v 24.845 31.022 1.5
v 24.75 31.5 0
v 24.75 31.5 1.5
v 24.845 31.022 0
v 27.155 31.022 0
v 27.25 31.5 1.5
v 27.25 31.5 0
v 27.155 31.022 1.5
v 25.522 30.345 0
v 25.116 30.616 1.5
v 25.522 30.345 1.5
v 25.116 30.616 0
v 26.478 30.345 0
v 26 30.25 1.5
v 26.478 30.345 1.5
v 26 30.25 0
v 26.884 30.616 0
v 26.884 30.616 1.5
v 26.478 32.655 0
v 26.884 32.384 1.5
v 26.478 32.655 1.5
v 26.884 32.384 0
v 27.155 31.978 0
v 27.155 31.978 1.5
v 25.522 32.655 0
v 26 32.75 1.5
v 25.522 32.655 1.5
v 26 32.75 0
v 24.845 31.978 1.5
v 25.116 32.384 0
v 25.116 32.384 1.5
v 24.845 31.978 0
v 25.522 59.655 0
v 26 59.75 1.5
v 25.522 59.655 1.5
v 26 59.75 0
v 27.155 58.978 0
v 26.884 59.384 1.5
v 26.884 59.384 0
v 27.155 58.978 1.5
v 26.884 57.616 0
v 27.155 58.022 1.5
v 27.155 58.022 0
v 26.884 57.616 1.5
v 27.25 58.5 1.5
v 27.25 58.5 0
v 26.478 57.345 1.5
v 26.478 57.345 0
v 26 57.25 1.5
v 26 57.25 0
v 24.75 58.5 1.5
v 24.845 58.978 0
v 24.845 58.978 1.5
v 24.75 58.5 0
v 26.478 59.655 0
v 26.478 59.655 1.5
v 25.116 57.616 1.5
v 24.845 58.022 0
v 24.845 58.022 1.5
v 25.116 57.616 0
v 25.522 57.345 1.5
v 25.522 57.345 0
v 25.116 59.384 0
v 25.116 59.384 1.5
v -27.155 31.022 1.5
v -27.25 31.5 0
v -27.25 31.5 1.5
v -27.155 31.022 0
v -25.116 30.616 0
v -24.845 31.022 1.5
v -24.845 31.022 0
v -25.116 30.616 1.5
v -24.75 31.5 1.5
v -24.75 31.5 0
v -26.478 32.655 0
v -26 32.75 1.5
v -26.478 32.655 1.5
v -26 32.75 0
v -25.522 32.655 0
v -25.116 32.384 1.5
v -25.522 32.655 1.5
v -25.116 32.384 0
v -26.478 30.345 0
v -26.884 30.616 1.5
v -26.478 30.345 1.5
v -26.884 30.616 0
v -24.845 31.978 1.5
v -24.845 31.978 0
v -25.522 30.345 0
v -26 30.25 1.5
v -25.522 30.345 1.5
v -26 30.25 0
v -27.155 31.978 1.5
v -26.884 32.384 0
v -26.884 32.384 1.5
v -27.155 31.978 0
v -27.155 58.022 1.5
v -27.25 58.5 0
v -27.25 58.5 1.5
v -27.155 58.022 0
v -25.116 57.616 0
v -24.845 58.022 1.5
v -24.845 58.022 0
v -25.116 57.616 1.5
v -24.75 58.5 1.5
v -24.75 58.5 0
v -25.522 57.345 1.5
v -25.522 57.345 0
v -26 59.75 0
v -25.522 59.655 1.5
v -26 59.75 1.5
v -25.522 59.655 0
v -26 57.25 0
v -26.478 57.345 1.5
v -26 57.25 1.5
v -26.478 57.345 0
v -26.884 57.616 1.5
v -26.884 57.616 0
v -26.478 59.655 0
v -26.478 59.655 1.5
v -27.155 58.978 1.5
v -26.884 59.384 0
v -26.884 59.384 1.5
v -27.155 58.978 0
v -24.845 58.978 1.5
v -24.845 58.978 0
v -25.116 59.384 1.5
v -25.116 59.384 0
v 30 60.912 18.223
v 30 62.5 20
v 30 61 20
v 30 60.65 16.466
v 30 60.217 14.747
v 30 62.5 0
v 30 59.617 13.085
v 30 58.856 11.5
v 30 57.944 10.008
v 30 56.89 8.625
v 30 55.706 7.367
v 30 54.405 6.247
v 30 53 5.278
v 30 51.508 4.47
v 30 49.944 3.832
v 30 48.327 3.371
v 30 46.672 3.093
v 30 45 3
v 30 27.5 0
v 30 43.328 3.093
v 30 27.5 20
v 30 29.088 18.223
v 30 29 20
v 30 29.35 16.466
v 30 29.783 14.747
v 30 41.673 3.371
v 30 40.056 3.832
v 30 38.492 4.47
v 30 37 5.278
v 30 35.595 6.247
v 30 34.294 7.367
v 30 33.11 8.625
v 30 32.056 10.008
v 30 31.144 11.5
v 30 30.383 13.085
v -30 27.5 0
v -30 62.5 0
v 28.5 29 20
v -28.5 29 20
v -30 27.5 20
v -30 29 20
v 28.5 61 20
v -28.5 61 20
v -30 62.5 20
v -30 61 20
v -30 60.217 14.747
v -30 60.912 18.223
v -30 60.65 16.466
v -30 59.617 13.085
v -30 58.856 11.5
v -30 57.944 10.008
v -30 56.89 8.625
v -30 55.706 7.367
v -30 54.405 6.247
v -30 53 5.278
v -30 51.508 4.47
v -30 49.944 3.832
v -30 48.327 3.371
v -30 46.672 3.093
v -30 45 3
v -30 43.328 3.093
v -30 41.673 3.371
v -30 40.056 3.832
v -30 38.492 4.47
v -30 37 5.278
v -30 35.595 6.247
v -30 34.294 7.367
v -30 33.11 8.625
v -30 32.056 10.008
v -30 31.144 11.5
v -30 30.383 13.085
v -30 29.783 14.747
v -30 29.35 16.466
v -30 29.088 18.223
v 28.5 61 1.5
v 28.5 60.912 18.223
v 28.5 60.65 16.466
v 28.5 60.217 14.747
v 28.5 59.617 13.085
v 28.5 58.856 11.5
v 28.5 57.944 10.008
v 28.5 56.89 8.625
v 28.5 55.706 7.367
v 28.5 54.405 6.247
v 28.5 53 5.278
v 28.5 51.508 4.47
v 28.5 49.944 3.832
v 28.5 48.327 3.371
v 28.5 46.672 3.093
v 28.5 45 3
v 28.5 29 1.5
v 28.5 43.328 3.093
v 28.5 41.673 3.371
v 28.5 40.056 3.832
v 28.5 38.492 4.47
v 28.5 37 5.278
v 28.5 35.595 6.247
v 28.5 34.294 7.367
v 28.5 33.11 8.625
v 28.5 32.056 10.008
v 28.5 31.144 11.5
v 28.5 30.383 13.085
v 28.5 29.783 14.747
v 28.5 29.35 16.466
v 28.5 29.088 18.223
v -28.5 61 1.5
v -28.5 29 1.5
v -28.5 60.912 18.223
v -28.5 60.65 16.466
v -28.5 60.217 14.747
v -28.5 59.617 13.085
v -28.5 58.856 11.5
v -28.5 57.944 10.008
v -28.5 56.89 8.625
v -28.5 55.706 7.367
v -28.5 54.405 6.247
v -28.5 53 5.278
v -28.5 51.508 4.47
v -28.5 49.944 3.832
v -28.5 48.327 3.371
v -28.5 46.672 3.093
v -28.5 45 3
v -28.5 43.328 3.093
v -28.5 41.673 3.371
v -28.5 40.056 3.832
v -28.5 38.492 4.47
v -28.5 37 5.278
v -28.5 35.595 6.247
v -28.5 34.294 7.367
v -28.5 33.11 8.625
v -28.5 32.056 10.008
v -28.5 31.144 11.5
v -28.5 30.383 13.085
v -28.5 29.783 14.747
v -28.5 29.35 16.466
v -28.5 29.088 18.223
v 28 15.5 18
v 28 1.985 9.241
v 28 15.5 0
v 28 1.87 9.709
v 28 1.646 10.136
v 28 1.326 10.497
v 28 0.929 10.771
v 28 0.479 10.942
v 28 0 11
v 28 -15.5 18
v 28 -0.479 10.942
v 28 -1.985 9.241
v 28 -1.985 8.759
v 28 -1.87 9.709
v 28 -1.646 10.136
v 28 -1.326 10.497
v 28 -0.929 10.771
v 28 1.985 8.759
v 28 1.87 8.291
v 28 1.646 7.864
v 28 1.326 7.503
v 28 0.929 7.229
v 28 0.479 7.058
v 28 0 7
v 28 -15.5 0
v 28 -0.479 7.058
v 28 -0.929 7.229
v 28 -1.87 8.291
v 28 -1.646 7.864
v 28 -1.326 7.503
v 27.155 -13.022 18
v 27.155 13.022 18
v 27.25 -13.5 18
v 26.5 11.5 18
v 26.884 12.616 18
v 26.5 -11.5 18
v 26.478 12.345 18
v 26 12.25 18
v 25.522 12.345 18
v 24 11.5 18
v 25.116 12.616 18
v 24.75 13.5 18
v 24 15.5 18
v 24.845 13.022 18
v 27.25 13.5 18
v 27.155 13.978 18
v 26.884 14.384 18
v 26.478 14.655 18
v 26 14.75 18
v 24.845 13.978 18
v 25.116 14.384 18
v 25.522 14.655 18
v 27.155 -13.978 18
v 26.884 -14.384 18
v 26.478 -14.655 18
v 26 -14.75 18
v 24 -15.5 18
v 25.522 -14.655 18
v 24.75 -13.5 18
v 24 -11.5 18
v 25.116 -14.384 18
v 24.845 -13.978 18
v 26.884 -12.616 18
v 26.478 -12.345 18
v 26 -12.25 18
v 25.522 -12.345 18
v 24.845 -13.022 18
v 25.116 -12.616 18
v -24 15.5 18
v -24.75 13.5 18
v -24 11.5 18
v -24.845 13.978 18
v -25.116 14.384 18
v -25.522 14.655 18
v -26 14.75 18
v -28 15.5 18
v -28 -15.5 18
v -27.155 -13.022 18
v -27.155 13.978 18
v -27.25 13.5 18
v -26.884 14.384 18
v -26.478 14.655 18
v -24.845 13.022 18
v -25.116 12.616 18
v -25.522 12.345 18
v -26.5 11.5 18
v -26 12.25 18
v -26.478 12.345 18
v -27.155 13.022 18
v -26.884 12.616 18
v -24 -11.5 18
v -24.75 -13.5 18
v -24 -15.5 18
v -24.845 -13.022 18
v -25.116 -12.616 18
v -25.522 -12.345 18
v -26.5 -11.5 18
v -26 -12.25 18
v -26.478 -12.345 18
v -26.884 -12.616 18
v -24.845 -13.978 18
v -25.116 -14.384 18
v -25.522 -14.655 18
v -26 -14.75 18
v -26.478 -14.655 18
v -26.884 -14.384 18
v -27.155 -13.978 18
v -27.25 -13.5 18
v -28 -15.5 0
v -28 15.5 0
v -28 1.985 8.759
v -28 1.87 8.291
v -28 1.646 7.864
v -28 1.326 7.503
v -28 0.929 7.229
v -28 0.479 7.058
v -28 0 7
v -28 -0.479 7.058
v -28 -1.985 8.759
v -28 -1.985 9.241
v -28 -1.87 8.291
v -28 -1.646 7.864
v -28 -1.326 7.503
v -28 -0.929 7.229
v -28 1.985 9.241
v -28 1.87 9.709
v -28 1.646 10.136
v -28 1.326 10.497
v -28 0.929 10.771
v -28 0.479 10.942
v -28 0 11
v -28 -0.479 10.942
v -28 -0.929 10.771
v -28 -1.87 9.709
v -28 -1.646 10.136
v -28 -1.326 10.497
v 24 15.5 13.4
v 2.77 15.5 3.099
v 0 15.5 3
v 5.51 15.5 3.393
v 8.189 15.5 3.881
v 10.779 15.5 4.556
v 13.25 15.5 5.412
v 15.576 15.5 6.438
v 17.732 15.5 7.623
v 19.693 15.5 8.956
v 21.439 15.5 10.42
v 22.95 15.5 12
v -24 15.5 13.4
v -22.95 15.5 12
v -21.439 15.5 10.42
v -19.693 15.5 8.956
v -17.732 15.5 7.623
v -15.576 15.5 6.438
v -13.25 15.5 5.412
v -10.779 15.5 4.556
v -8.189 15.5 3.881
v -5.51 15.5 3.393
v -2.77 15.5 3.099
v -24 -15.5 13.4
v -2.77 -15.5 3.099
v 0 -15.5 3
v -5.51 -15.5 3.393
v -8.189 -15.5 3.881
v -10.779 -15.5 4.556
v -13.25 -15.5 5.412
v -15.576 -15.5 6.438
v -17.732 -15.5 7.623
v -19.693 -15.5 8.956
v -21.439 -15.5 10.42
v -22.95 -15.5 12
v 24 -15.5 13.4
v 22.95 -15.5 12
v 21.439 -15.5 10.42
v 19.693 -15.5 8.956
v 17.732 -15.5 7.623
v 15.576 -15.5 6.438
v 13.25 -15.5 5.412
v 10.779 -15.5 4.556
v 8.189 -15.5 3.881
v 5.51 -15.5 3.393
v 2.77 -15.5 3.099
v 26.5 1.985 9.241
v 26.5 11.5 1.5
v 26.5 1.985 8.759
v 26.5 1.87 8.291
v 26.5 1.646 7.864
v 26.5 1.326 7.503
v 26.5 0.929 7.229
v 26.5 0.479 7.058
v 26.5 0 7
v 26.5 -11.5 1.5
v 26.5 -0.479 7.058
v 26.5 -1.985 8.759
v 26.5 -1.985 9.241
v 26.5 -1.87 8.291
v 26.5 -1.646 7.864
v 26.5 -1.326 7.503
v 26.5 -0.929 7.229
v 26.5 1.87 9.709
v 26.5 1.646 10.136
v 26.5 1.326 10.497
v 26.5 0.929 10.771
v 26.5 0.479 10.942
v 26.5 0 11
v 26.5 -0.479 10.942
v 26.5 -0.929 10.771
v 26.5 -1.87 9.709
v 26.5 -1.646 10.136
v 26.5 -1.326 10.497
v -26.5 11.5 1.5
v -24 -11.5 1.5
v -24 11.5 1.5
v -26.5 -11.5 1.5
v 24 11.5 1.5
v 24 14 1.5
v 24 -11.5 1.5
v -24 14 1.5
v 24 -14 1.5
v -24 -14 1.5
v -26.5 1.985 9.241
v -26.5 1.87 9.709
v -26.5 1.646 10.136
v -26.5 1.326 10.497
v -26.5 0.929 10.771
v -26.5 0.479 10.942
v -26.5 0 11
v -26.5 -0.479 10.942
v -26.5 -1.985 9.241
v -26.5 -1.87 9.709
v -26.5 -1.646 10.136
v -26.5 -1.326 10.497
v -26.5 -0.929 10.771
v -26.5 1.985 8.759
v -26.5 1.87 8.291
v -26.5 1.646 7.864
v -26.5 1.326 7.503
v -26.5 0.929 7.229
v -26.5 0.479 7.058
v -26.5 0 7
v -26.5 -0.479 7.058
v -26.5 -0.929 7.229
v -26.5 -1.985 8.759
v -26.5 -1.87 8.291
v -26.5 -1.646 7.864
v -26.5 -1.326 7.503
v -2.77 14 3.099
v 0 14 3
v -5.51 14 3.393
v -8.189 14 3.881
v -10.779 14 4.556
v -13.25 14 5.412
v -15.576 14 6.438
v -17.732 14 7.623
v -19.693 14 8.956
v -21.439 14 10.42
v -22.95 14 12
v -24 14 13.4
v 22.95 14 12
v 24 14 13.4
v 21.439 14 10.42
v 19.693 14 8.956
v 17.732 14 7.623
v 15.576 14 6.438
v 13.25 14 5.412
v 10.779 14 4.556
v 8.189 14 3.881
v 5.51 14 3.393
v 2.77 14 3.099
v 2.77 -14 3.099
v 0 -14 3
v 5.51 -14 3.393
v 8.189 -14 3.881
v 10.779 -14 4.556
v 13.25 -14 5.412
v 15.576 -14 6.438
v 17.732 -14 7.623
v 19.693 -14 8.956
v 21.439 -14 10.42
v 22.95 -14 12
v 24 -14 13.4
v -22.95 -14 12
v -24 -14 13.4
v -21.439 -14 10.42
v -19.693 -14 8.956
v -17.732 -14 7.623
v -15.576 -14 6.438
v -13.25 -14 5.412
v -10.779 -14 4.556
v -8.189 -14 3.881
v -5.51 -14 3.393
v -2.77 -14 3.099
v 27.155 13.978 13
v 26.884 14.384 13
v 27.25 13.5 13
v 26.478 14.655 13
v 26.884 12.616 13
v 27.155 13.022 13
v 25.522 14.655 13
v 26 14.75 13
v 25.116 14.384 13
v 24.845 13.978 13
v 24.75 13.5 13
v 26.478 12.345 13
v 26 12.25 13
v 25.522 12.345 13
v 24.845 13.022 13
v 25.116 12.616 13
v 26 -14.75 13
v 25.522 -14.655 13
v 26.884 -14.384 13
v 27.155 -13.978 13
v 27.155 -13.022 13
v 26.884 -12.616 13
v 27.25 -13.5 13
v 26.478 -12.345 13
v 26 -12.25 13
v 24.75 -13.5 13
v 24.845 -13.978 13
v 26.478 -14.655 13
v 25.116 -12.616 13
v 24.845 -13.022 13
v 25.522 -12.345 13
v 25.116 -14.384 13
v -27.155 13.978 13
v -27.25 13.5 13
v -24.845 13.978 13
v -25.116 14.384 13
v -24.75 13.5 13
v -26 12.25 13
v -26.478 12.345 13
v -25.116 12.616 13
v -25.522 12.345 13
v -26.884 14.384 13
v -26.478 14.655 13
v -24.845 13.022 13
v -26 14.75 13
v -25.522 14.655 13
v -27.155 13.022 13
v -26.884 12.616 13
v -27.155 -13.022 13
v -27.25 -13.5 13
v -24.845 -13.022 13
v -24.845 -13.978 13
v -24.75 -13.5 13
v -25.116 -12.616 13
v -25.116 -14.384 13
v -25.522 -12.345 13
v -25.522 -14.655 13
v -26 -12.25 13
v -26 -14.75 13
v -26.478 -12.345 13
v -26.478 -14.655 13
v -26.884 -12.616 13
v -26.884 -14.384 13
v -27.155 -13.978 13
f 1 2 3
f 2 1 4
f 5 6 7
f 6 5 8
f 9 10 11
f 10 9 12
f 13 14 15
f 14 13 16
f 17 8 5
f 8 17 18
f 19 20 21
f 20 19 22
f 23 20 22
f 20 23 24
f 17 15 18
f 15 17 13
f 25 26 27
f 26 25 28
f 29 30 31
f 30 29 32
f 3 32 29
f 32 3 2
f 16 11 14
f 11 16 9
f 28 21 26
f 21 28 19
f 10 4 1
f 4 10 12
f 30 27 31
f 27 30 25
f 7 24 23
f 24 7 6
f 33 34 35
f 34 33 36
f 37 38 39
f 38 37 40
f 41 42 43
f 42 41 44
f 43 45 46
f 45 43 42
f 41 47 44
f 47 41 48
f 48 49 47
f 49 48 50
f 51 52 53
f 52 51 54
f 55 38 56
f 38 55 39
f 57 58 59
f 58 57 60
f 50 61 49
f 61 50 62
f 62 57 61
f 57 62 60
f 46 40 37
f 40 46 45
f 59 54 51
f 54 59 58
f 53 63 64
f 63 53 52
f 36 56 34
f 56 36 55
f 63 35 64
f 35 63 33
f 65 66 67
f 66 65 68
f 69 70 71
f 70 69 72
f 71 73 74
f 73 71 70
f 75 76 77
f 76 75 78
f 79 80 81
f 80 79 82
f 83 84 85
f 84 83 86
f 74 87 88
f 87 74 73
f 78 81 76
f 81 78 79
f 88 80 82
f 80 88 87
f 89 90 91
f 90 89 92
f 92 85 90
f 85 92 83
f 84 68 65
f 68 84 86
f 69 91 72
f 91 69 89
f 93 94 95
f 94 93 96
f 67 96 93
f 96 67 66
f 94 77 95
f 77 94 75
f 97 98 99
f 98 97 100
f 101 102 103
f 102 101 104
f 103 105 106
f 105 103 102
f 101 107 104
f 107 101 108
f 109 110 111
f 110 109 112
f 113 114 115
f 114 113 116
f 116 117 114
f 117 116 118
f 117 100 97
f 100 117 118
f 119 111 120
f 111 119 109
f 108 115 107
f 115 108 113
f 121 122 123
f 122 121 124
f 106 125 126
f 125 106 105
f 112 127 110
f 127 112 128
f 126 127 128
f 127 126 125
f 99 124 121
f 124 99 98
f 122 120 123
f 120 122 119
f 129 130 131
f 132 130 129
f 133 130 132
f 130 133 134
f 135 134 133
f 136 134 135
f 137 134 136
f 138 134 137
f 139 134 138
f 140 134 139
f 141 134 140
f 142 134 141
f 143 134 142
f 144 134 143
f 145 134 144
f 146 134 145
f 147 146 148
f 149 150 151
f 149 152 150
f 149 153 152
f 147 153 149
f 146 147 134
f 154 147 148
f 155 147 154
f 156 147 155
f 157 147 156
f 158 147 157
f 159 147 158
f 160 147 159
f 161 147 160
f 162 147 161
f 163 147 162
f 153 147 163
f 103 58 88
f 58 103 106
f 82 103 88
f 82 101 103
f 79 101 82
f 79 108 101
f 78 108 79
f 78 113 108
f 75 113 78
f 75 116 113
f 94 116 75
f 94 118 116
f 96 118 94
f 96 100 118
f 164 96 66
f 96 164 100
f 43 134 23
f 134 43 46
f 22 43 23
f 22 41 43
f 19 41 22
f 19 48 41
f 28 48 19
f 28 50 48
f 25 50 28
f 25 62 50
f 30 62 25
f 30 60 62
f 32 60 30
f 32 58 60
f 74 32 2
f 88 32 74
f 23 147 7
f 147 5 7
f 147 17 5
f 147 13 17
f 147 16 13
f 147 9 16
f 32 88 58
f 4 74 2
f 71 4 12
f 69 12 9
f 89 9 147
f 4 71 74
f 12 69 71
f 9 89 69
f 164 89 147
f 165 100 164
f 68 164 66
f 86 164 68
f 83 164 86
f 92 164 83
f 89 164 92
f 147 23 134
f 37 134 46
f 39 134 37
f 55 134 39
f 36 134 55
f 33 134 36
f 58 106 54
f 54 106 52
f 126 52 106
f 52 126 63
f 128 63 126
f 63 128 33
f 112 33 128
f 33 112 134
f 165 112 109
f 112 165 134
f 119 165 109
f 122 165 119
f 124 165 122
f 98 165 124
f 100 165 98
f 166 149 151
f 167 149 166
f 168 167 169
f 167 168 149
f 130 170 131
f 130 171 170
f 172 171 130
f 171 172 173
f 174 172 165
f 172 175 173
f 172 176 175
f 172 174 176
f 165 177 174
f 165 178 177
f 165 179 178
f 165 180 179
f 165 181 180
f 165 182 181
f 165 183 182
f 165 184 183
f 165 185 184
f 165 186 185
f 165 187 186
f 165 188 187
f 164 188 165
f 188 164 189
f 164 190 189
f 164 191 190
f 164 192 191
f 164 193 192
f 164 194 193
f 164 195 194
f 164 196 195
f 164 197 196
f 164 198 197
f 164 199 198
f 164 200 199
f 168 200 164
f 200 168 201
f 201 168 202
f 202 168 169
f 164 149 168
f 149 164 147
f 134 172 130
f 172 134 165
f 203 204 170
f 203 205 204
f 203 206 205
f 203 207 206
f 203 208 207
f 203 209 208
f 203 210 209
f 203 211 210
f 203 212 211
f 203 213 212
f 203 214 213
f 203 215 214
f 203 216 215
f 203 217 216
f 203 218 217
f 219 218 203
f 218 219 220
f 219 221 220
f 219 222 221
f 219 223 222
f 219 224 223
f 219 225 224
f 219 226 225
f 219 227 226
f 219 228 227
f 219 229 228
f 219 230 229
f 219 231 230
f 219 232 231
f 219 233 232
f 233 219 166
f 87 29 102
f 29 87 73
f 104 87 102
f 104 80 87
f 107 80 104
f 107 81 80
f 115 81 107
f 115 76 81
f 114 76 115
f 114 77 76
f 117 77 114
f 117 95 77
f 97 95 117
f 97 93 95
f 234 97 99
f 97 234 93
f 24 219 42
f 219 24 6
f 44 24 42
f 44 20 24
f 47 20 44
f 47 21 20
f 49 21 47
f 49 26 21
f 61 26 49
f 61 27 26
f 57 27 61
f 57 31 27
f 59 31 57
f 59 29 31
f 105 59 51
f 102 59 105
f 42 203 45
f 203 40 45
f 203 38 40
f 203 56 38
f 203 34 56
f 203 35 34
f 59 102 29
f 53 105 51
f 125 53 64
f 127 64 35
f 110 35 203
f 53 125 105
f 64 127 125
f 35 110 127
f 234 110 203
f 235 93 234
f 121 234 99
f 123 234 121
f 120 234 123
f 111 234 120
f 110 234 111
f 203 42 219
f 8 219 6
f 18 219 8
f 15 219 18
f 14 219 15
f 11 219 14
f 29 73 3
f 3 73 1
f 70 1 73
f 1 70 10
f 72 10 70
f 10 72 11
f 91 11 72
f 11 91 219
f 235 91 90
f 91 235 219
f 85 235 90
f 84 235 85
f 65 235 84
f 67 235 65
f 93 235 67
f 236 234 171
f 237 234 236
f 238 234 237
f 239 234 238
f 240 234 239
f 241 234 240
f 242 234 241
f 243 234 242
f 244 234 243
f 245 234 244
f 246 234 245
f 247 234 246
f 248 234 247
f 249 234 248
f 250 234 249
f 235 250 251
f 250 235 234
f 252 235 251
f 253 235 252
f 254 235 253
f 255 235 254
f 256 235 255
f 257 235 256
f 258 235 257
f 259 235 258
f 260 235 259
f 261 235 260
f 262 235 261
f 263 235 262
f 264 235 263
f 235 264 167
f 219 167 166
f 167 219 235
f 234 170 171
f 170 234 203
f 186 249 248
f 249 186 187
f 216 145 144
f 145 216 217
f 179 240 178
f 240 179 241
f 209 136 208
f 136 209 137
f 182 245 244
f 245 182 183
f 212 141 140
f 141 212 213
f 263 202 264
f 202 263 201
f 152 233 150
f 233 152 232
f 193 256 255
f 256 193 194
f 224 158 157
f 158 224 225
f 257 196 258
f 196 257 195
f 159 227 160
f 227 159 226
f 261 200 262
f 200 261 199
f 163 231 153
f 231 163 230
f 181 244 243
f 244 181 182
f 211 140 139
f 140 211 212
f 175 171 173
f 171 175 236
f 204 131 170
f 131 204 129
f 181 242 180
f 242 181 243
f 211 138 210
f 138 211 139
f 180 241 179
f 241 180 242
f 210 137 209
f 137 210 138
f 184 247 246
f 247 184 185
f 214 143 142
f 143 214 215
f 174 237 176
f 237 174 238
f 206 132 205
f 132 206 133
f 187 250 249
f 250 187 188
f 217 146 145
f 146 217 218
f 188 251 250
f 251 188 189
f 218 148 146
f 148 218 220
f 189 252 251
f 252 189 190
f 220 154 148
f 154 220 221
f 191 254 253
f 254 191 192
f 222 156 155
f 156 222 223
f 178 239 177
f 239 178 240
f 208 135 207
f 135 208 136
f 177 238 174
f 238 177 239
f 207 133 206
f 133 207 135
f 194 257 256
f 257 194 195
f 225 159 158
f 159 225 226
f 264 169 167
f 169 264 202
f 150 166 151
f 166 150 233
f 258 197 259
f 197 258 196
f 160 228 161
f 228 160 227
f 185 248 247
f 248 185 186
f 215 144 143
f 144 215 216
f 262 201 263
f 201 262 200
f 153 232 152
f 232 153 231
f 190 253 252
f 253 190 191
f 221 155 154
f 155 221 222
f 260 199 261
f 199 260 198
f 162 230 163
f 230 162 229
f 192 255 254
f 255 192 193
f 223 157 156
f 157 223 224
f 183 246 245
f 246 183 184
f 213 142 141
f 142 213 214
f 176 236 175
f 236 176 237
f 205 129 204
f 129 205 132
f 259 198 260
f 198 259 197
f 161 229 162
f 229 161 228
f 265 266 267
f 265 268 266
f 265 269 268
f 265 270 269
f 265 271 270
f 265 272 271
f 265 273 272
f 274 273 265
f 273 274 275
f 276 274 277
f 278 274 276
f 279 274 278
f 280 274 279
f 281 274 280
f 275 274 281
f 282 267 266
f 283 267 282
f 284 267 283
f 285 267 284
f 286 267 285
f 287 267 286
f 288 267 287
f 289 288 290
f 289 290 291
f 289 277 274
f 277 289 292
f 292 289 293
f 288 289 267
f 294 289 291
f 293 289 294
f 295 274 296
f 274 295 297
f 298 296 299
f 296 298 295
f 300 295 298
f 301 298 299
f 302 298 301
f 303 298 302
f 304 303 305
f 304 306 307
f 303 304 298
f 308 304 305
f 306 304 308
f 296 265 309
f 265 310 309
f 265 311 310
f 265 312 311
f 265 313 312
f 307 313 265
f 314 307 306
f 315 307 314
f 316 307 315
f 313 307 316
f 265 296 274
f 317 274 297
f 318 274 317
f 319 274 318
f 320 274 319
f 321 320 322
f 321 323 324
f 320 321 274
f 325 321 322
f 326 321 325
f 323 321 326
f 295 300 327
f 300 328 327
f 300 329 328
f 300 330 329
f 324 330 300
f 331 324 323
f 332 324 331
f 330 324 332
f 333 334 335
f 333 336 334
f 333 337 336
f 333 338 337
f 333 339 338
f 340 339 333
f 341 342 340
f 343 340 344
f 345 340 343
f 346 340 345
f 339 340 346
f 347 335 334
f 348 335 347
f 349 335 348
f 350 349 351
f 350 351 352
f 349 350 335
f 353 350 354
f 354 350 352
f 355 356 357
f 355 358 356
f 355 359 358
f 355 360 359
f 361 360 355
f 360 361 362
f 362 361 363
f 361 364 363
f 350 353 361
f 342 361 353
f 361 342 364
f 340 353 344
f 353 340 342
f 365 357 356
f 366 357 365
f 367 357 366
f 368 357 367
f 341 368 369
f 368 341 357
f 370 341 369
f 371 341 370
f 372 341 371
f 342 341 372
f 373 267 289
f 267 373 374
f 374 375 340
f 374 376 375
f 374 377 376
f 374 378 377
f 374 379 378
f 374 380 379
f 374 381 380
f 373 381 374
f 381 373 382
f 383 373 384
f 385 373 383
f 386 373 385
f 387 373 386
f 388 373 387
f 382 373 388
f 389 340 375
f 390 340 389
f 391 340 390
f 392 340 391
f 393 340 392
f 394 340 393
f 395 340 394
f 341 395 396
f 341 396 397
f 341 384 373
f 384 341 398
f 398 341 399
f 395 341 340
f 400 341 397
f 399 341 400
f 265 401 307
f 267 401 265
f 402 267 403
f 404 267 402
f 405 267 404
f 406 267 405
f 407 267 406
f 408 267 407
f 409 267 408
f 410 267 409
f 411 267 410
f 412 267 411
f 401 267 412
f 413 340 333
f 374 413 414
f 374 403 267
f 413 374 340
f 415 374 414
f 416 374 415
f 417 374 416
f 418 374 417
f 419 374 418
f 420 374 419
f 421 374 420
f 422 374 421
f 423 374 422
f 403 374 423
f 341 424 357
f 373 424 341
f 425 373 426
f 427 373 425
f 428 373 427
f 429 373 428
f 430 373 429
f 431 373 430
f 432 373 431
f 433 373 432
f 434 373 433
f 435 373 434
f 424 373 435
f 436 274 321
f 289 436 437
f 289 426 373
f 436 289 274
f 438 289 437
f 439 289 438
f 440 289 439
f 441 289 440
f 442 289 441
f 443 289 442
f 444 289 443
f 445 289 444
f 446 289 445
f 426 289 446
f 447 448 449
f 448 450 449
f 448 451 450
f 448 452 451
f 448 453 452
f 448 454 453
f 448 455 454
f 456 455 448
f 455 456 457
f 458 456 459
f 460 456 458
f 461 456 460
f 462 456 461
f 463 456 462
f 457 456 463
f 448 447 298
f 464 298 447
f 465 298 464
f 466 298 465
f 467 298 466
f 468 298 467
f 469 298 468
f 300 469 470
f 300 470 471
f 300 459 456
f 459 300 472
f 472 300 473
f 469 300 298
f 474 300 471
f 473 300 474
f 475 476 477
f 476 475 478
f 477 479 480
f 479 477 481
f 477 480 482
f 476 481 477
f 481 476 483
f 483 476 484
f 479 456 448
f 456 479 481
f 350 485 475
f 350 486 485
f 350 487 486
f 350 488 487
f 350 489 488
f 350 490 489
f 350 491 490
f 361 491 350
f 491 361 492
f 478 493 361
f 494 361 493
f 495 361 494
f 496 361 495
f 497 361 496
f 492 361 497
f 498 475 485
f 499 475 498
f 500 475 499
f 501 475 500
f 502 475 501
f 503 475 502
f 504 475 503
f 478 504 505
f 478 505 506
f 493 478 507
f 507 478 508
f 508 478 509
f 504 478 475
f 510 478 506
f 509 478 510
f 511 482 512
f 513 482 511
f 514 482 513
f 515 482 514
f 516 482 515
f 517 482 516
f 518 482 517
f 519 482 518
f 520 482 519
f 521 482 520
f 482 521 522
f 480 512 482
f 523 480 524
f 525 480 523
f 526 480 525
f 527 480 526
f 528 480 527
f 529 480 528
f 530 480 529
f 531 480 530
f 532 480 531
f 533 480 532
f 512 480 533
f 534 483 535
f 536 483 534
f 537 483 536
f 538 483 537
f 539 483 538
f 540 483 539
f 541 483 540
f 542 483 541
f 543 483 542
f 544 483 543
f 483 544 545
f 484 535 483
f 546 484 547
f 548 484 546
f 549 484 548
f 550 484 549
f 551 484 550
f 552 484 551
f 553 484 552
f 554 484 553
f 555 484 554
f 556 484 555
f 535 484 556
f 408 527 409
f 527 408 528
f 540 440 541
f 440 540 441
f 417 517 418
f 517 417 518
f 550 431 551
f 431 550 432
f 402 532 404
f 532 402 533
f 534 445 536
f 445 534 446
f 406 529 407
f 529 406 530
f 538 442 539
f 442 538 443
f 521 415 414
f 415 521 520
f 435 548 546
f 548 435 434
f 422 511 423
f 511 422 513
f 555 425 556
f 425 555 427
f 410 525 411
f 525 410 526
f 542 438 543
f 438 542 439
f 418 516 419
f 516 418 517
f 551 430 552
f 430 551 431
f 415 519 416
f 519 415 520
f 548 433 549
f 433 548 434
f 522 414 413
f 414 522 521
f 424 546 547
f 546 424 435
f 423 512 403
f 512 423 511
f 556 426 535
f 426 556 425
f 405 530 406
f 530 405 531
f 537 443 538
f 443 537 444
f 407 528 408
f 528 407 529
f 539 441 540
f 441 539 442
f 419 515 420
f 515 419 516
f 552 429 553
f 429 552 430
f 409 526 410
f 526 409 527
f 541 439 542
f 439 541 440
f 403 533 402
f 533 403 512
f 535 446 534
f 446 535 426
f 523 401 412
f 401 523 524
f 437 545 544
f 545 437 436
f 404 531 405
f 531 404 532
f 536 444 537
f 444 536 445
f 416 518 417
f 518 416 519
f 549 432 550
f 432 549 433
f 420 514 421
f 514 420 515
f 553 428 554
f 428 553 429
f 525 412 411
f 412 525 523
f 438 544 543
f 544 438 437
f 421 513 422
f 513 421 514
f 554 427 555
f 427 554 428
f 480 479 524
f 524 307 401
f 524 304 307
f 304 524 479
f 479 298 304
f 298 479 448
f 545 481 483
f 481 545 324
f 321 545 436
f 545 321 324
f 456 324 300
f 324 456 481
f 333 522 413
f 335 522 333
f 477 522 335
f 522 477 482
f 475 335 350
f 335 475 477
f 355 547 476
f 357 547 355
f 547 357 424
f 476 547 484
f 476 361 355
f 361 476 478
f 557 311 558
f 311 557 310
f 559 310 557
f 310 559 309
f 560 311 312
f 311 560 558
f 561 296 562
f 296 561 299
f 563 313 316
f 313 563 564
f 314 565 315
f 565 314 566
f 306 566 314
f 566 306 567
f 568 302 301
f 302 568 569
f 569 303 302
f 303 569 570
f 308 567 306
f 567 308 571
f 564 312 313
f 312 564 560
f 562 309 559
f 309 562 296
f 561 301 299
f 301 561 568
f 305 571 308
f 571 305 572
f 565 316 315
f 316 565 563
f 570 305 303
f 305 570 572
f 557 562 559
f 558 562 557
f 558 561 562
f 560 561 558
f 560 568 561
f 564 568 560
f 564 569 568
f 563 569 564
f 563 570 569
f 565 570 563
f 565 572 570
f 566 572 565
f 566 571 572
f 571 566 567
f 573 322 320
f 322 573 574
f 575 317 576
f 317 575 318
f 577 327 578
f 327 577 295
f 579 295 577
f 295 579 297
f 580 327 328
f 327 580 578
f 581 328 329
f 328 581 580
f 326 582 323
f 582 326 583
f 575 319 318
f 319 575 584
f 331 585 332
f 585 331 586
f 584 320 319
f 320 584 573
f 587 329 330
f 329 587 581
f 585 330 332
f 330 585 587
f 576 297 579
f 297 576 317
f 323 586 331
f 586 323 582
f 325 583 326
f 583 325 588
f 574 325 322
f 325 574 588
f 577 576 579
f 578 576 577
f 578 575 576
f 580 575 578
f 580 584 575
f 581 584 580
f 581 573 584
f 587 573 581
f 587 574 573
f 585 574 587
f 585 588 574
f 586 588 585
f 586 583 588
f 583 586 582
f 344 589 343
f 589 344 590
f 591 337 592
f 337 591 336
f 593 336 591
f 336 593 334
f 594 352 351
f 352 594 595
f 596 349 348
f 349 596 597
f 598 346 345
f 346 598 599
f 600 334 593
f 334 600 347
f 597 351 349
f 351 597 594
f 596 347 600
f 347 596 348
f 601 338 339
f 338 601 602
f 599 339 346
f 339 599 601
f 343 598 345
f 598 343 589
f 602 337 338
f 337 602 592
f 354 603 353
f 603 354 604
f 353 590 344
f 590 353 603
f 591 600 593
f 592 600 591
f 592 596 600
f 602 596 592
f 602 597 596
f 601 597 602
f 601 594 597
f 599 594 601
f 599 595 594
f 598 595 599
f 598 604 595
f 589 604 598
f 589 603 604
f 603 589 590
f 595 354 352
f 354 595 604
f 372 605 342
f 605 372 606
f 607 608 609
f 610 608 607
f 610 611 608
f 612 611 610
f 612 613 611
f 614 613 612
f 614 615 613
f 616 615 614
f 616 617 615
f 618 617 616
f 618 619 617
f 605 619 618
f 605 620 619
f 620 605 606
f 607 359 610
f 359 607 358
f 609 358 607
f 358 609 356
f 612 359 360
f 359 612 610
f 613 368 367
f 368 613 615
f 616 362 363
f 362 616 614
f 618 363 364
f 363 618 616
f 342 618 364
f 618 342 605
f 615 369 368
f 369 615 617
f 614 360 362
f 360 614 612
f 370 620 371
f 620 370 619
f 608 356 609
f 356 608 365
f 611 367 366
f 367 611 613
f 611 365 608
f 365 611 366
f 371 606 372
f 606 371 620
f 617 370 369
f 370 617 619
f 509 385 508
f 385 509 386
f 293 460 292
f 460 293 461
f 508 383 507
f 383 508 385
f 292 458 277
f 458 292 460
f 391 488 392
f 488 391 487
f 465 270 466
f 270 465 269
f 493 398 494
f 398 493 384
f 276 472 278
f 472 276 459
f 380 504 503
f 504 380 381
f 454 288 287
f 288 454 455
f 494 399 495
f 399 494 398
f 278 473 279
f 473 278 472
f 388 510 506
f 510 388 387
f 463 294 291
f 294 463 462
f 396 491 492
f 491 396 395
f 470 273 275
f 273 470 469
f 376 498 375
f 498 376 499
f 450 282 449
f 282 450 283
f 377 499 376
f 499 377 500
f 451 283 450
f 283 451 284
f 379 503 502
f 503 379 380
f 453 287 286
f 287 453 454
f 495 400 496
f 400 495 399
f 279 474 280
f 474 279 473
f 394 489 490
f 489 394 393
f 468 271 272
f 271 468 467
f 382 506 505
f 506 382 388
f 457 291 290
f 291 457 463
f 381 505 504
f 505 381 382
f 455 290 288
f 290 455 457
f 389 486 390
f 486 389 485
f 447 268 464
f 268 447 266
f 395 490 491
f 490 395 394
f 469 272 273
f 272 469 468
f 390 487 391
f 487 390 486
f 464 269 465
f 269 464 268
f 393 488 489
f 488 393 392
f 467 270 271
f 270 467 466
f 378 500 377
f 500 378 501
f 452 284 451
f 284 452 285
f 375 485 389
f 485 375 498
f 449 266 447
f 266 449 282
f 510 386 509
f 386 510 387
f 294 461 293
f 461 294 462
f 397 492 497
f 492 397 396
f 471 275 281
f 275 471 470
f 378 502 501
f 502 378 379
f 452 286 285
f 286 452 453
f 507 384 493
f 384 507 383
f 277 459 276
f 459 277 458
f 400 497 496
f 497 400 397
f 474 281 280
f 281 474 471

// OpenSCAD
union(){
  // place lid
  translate(v=[0, 45, 0])
    translate(v=[0, 0, 20])
      rotate(a=[180, 0, 0])
        // lid
        difference(){
          // outer box
          translate(v=[-30, -17.5, 0])
            cube(size=[60, 35, 20]);
          // inner box
          translate(v=[0, 0, -0.1])
            translate(v=[-28.5, -16, 0])
              cube(size=[57, 32, 18.6]);
          // screw holes
          union(){
            translate(v=[26, 13.5, 0])
              // screw hole
              translate(v=[0, 0, -100])
                cylinder(h=200, d1=2.5, d2=2.5, $fa=6, $fs=0.5);
            translate(v=[26, -13.5, 0])
              // screw hole
              translate(v=[0, 0, -100])
                cylinder(h=200, d1=2.5, d2=2.5, $fa=6, $fs=0.5);
            translate(v=[-26, 13.5, 0])
              // screw hole
              translate(v=[0, 0, -100])
                cylinder(h=200, d1=2.5, d2=2.5, $fa=6, $fs=0.5);
            translate(v=[-26, -13.5, 0])
              // screw hole
              translate(v=[0, 0, -100])
                cylinder(h=200, d1=2.5, d2=2.5, $fa=6, $fs=0.5);
          }
          // tunnel
          rotate(a=[0, 90, 0])
            linear_extrude(height=100, center=true, convexity=10)
              translate(v=[0, 0, 0])
                resize(newsize=[34, 32])
                  translate(v=[0, 0, 0])
                    circle(d=34, $fa=6, $fs=0.5);
        }
  difference(){
    union(){
      // wall
      difference(){
        // base box
        difference(){
          translate(v=[-28, -15.5, 0])
            cube(size=[56, 31, 18]);
          translate(v=[0, 0, 1.5])
            translate(v=[-26.5, -14, 0])
              cube(size=[53, 28, 16.6]);
        }
        // half pipe
        translate(v=[0, 0, 21])
          rotate(a=[90, 0, 0])
            linear_extrude(height=31.2, center=true, convexity=10)
              #
              translate(v=[0, 0, 0])
                resize(newsize=[53, 36])
                  translate(v=[0, 0, 0])
                    circle(d=53, $fa=6, $fs=0.5);
      }
      // pillars
      union(){
        translate(v=[26, 13.5, 0])
          // pillar
          translate(v=[-2, -2, 0])
            cube(size=[4, 4, 18]);
        translate(v=[26, -13.5, 0])
          // pillar
          translate(v=[-2, -2, 0])
            cube(size=[4, 4, 18]);
        translate(v=[-26, 13.5, 0])
          // pillar
          translate(v=[-2, -2, 0])
            cube(size=[4, 4, 18]);
        translate(v=[-26, -13.5, 0])
          // pillar
          translate(v=[-2, -2, 0])
            cube(size=[4, 4, 18]);
      }
    }
    // wire holes
    translate(v=[0, 0, 9])
      rotate(a=[0, 90, 0])
        translate(v=[0, 0, -100])
          cylinder(h=200, d1=4, d2=4, $fa=6, $fs=0.5);
    // screw holders
    union(){
      translate(v=[26, 13.5, 0])
        // screw holder
        translate(v=[0, 0, 13])
          translate(v=[0, 0, 0])
            cylinder(h=5.1, d1=2.5, d2=2.5, $fa=6, $fs=0.5);
      translate(v=[26, -13.5, 0])
        // screw holder
        translate(v=[0, 0, 13])
          translate(v=[0, 0, 0])
            cylinder(h=5.1, d1=2.5, d2=2.5, $fa=6, $fs=0.5);
      translate(v=[-26, 13.5, 0])
        // screw holder
        translate(v=[0, 0, 13])
          translate(v=[0, 0, 0])
            cylinder(h=5.1, d1=2.5, d2=2.5, $fa=6, $fs=0.5);
      translate(v=[-26, -13.5, 0])
        // screw holder
        translate(v=[0, 0, 13])
          translate(v=[0, 0, 0])
            cylinder(h=5.1, d1=2.5, d2=2.5, $fa=6, $fs=0.5);
    }
  }
}
